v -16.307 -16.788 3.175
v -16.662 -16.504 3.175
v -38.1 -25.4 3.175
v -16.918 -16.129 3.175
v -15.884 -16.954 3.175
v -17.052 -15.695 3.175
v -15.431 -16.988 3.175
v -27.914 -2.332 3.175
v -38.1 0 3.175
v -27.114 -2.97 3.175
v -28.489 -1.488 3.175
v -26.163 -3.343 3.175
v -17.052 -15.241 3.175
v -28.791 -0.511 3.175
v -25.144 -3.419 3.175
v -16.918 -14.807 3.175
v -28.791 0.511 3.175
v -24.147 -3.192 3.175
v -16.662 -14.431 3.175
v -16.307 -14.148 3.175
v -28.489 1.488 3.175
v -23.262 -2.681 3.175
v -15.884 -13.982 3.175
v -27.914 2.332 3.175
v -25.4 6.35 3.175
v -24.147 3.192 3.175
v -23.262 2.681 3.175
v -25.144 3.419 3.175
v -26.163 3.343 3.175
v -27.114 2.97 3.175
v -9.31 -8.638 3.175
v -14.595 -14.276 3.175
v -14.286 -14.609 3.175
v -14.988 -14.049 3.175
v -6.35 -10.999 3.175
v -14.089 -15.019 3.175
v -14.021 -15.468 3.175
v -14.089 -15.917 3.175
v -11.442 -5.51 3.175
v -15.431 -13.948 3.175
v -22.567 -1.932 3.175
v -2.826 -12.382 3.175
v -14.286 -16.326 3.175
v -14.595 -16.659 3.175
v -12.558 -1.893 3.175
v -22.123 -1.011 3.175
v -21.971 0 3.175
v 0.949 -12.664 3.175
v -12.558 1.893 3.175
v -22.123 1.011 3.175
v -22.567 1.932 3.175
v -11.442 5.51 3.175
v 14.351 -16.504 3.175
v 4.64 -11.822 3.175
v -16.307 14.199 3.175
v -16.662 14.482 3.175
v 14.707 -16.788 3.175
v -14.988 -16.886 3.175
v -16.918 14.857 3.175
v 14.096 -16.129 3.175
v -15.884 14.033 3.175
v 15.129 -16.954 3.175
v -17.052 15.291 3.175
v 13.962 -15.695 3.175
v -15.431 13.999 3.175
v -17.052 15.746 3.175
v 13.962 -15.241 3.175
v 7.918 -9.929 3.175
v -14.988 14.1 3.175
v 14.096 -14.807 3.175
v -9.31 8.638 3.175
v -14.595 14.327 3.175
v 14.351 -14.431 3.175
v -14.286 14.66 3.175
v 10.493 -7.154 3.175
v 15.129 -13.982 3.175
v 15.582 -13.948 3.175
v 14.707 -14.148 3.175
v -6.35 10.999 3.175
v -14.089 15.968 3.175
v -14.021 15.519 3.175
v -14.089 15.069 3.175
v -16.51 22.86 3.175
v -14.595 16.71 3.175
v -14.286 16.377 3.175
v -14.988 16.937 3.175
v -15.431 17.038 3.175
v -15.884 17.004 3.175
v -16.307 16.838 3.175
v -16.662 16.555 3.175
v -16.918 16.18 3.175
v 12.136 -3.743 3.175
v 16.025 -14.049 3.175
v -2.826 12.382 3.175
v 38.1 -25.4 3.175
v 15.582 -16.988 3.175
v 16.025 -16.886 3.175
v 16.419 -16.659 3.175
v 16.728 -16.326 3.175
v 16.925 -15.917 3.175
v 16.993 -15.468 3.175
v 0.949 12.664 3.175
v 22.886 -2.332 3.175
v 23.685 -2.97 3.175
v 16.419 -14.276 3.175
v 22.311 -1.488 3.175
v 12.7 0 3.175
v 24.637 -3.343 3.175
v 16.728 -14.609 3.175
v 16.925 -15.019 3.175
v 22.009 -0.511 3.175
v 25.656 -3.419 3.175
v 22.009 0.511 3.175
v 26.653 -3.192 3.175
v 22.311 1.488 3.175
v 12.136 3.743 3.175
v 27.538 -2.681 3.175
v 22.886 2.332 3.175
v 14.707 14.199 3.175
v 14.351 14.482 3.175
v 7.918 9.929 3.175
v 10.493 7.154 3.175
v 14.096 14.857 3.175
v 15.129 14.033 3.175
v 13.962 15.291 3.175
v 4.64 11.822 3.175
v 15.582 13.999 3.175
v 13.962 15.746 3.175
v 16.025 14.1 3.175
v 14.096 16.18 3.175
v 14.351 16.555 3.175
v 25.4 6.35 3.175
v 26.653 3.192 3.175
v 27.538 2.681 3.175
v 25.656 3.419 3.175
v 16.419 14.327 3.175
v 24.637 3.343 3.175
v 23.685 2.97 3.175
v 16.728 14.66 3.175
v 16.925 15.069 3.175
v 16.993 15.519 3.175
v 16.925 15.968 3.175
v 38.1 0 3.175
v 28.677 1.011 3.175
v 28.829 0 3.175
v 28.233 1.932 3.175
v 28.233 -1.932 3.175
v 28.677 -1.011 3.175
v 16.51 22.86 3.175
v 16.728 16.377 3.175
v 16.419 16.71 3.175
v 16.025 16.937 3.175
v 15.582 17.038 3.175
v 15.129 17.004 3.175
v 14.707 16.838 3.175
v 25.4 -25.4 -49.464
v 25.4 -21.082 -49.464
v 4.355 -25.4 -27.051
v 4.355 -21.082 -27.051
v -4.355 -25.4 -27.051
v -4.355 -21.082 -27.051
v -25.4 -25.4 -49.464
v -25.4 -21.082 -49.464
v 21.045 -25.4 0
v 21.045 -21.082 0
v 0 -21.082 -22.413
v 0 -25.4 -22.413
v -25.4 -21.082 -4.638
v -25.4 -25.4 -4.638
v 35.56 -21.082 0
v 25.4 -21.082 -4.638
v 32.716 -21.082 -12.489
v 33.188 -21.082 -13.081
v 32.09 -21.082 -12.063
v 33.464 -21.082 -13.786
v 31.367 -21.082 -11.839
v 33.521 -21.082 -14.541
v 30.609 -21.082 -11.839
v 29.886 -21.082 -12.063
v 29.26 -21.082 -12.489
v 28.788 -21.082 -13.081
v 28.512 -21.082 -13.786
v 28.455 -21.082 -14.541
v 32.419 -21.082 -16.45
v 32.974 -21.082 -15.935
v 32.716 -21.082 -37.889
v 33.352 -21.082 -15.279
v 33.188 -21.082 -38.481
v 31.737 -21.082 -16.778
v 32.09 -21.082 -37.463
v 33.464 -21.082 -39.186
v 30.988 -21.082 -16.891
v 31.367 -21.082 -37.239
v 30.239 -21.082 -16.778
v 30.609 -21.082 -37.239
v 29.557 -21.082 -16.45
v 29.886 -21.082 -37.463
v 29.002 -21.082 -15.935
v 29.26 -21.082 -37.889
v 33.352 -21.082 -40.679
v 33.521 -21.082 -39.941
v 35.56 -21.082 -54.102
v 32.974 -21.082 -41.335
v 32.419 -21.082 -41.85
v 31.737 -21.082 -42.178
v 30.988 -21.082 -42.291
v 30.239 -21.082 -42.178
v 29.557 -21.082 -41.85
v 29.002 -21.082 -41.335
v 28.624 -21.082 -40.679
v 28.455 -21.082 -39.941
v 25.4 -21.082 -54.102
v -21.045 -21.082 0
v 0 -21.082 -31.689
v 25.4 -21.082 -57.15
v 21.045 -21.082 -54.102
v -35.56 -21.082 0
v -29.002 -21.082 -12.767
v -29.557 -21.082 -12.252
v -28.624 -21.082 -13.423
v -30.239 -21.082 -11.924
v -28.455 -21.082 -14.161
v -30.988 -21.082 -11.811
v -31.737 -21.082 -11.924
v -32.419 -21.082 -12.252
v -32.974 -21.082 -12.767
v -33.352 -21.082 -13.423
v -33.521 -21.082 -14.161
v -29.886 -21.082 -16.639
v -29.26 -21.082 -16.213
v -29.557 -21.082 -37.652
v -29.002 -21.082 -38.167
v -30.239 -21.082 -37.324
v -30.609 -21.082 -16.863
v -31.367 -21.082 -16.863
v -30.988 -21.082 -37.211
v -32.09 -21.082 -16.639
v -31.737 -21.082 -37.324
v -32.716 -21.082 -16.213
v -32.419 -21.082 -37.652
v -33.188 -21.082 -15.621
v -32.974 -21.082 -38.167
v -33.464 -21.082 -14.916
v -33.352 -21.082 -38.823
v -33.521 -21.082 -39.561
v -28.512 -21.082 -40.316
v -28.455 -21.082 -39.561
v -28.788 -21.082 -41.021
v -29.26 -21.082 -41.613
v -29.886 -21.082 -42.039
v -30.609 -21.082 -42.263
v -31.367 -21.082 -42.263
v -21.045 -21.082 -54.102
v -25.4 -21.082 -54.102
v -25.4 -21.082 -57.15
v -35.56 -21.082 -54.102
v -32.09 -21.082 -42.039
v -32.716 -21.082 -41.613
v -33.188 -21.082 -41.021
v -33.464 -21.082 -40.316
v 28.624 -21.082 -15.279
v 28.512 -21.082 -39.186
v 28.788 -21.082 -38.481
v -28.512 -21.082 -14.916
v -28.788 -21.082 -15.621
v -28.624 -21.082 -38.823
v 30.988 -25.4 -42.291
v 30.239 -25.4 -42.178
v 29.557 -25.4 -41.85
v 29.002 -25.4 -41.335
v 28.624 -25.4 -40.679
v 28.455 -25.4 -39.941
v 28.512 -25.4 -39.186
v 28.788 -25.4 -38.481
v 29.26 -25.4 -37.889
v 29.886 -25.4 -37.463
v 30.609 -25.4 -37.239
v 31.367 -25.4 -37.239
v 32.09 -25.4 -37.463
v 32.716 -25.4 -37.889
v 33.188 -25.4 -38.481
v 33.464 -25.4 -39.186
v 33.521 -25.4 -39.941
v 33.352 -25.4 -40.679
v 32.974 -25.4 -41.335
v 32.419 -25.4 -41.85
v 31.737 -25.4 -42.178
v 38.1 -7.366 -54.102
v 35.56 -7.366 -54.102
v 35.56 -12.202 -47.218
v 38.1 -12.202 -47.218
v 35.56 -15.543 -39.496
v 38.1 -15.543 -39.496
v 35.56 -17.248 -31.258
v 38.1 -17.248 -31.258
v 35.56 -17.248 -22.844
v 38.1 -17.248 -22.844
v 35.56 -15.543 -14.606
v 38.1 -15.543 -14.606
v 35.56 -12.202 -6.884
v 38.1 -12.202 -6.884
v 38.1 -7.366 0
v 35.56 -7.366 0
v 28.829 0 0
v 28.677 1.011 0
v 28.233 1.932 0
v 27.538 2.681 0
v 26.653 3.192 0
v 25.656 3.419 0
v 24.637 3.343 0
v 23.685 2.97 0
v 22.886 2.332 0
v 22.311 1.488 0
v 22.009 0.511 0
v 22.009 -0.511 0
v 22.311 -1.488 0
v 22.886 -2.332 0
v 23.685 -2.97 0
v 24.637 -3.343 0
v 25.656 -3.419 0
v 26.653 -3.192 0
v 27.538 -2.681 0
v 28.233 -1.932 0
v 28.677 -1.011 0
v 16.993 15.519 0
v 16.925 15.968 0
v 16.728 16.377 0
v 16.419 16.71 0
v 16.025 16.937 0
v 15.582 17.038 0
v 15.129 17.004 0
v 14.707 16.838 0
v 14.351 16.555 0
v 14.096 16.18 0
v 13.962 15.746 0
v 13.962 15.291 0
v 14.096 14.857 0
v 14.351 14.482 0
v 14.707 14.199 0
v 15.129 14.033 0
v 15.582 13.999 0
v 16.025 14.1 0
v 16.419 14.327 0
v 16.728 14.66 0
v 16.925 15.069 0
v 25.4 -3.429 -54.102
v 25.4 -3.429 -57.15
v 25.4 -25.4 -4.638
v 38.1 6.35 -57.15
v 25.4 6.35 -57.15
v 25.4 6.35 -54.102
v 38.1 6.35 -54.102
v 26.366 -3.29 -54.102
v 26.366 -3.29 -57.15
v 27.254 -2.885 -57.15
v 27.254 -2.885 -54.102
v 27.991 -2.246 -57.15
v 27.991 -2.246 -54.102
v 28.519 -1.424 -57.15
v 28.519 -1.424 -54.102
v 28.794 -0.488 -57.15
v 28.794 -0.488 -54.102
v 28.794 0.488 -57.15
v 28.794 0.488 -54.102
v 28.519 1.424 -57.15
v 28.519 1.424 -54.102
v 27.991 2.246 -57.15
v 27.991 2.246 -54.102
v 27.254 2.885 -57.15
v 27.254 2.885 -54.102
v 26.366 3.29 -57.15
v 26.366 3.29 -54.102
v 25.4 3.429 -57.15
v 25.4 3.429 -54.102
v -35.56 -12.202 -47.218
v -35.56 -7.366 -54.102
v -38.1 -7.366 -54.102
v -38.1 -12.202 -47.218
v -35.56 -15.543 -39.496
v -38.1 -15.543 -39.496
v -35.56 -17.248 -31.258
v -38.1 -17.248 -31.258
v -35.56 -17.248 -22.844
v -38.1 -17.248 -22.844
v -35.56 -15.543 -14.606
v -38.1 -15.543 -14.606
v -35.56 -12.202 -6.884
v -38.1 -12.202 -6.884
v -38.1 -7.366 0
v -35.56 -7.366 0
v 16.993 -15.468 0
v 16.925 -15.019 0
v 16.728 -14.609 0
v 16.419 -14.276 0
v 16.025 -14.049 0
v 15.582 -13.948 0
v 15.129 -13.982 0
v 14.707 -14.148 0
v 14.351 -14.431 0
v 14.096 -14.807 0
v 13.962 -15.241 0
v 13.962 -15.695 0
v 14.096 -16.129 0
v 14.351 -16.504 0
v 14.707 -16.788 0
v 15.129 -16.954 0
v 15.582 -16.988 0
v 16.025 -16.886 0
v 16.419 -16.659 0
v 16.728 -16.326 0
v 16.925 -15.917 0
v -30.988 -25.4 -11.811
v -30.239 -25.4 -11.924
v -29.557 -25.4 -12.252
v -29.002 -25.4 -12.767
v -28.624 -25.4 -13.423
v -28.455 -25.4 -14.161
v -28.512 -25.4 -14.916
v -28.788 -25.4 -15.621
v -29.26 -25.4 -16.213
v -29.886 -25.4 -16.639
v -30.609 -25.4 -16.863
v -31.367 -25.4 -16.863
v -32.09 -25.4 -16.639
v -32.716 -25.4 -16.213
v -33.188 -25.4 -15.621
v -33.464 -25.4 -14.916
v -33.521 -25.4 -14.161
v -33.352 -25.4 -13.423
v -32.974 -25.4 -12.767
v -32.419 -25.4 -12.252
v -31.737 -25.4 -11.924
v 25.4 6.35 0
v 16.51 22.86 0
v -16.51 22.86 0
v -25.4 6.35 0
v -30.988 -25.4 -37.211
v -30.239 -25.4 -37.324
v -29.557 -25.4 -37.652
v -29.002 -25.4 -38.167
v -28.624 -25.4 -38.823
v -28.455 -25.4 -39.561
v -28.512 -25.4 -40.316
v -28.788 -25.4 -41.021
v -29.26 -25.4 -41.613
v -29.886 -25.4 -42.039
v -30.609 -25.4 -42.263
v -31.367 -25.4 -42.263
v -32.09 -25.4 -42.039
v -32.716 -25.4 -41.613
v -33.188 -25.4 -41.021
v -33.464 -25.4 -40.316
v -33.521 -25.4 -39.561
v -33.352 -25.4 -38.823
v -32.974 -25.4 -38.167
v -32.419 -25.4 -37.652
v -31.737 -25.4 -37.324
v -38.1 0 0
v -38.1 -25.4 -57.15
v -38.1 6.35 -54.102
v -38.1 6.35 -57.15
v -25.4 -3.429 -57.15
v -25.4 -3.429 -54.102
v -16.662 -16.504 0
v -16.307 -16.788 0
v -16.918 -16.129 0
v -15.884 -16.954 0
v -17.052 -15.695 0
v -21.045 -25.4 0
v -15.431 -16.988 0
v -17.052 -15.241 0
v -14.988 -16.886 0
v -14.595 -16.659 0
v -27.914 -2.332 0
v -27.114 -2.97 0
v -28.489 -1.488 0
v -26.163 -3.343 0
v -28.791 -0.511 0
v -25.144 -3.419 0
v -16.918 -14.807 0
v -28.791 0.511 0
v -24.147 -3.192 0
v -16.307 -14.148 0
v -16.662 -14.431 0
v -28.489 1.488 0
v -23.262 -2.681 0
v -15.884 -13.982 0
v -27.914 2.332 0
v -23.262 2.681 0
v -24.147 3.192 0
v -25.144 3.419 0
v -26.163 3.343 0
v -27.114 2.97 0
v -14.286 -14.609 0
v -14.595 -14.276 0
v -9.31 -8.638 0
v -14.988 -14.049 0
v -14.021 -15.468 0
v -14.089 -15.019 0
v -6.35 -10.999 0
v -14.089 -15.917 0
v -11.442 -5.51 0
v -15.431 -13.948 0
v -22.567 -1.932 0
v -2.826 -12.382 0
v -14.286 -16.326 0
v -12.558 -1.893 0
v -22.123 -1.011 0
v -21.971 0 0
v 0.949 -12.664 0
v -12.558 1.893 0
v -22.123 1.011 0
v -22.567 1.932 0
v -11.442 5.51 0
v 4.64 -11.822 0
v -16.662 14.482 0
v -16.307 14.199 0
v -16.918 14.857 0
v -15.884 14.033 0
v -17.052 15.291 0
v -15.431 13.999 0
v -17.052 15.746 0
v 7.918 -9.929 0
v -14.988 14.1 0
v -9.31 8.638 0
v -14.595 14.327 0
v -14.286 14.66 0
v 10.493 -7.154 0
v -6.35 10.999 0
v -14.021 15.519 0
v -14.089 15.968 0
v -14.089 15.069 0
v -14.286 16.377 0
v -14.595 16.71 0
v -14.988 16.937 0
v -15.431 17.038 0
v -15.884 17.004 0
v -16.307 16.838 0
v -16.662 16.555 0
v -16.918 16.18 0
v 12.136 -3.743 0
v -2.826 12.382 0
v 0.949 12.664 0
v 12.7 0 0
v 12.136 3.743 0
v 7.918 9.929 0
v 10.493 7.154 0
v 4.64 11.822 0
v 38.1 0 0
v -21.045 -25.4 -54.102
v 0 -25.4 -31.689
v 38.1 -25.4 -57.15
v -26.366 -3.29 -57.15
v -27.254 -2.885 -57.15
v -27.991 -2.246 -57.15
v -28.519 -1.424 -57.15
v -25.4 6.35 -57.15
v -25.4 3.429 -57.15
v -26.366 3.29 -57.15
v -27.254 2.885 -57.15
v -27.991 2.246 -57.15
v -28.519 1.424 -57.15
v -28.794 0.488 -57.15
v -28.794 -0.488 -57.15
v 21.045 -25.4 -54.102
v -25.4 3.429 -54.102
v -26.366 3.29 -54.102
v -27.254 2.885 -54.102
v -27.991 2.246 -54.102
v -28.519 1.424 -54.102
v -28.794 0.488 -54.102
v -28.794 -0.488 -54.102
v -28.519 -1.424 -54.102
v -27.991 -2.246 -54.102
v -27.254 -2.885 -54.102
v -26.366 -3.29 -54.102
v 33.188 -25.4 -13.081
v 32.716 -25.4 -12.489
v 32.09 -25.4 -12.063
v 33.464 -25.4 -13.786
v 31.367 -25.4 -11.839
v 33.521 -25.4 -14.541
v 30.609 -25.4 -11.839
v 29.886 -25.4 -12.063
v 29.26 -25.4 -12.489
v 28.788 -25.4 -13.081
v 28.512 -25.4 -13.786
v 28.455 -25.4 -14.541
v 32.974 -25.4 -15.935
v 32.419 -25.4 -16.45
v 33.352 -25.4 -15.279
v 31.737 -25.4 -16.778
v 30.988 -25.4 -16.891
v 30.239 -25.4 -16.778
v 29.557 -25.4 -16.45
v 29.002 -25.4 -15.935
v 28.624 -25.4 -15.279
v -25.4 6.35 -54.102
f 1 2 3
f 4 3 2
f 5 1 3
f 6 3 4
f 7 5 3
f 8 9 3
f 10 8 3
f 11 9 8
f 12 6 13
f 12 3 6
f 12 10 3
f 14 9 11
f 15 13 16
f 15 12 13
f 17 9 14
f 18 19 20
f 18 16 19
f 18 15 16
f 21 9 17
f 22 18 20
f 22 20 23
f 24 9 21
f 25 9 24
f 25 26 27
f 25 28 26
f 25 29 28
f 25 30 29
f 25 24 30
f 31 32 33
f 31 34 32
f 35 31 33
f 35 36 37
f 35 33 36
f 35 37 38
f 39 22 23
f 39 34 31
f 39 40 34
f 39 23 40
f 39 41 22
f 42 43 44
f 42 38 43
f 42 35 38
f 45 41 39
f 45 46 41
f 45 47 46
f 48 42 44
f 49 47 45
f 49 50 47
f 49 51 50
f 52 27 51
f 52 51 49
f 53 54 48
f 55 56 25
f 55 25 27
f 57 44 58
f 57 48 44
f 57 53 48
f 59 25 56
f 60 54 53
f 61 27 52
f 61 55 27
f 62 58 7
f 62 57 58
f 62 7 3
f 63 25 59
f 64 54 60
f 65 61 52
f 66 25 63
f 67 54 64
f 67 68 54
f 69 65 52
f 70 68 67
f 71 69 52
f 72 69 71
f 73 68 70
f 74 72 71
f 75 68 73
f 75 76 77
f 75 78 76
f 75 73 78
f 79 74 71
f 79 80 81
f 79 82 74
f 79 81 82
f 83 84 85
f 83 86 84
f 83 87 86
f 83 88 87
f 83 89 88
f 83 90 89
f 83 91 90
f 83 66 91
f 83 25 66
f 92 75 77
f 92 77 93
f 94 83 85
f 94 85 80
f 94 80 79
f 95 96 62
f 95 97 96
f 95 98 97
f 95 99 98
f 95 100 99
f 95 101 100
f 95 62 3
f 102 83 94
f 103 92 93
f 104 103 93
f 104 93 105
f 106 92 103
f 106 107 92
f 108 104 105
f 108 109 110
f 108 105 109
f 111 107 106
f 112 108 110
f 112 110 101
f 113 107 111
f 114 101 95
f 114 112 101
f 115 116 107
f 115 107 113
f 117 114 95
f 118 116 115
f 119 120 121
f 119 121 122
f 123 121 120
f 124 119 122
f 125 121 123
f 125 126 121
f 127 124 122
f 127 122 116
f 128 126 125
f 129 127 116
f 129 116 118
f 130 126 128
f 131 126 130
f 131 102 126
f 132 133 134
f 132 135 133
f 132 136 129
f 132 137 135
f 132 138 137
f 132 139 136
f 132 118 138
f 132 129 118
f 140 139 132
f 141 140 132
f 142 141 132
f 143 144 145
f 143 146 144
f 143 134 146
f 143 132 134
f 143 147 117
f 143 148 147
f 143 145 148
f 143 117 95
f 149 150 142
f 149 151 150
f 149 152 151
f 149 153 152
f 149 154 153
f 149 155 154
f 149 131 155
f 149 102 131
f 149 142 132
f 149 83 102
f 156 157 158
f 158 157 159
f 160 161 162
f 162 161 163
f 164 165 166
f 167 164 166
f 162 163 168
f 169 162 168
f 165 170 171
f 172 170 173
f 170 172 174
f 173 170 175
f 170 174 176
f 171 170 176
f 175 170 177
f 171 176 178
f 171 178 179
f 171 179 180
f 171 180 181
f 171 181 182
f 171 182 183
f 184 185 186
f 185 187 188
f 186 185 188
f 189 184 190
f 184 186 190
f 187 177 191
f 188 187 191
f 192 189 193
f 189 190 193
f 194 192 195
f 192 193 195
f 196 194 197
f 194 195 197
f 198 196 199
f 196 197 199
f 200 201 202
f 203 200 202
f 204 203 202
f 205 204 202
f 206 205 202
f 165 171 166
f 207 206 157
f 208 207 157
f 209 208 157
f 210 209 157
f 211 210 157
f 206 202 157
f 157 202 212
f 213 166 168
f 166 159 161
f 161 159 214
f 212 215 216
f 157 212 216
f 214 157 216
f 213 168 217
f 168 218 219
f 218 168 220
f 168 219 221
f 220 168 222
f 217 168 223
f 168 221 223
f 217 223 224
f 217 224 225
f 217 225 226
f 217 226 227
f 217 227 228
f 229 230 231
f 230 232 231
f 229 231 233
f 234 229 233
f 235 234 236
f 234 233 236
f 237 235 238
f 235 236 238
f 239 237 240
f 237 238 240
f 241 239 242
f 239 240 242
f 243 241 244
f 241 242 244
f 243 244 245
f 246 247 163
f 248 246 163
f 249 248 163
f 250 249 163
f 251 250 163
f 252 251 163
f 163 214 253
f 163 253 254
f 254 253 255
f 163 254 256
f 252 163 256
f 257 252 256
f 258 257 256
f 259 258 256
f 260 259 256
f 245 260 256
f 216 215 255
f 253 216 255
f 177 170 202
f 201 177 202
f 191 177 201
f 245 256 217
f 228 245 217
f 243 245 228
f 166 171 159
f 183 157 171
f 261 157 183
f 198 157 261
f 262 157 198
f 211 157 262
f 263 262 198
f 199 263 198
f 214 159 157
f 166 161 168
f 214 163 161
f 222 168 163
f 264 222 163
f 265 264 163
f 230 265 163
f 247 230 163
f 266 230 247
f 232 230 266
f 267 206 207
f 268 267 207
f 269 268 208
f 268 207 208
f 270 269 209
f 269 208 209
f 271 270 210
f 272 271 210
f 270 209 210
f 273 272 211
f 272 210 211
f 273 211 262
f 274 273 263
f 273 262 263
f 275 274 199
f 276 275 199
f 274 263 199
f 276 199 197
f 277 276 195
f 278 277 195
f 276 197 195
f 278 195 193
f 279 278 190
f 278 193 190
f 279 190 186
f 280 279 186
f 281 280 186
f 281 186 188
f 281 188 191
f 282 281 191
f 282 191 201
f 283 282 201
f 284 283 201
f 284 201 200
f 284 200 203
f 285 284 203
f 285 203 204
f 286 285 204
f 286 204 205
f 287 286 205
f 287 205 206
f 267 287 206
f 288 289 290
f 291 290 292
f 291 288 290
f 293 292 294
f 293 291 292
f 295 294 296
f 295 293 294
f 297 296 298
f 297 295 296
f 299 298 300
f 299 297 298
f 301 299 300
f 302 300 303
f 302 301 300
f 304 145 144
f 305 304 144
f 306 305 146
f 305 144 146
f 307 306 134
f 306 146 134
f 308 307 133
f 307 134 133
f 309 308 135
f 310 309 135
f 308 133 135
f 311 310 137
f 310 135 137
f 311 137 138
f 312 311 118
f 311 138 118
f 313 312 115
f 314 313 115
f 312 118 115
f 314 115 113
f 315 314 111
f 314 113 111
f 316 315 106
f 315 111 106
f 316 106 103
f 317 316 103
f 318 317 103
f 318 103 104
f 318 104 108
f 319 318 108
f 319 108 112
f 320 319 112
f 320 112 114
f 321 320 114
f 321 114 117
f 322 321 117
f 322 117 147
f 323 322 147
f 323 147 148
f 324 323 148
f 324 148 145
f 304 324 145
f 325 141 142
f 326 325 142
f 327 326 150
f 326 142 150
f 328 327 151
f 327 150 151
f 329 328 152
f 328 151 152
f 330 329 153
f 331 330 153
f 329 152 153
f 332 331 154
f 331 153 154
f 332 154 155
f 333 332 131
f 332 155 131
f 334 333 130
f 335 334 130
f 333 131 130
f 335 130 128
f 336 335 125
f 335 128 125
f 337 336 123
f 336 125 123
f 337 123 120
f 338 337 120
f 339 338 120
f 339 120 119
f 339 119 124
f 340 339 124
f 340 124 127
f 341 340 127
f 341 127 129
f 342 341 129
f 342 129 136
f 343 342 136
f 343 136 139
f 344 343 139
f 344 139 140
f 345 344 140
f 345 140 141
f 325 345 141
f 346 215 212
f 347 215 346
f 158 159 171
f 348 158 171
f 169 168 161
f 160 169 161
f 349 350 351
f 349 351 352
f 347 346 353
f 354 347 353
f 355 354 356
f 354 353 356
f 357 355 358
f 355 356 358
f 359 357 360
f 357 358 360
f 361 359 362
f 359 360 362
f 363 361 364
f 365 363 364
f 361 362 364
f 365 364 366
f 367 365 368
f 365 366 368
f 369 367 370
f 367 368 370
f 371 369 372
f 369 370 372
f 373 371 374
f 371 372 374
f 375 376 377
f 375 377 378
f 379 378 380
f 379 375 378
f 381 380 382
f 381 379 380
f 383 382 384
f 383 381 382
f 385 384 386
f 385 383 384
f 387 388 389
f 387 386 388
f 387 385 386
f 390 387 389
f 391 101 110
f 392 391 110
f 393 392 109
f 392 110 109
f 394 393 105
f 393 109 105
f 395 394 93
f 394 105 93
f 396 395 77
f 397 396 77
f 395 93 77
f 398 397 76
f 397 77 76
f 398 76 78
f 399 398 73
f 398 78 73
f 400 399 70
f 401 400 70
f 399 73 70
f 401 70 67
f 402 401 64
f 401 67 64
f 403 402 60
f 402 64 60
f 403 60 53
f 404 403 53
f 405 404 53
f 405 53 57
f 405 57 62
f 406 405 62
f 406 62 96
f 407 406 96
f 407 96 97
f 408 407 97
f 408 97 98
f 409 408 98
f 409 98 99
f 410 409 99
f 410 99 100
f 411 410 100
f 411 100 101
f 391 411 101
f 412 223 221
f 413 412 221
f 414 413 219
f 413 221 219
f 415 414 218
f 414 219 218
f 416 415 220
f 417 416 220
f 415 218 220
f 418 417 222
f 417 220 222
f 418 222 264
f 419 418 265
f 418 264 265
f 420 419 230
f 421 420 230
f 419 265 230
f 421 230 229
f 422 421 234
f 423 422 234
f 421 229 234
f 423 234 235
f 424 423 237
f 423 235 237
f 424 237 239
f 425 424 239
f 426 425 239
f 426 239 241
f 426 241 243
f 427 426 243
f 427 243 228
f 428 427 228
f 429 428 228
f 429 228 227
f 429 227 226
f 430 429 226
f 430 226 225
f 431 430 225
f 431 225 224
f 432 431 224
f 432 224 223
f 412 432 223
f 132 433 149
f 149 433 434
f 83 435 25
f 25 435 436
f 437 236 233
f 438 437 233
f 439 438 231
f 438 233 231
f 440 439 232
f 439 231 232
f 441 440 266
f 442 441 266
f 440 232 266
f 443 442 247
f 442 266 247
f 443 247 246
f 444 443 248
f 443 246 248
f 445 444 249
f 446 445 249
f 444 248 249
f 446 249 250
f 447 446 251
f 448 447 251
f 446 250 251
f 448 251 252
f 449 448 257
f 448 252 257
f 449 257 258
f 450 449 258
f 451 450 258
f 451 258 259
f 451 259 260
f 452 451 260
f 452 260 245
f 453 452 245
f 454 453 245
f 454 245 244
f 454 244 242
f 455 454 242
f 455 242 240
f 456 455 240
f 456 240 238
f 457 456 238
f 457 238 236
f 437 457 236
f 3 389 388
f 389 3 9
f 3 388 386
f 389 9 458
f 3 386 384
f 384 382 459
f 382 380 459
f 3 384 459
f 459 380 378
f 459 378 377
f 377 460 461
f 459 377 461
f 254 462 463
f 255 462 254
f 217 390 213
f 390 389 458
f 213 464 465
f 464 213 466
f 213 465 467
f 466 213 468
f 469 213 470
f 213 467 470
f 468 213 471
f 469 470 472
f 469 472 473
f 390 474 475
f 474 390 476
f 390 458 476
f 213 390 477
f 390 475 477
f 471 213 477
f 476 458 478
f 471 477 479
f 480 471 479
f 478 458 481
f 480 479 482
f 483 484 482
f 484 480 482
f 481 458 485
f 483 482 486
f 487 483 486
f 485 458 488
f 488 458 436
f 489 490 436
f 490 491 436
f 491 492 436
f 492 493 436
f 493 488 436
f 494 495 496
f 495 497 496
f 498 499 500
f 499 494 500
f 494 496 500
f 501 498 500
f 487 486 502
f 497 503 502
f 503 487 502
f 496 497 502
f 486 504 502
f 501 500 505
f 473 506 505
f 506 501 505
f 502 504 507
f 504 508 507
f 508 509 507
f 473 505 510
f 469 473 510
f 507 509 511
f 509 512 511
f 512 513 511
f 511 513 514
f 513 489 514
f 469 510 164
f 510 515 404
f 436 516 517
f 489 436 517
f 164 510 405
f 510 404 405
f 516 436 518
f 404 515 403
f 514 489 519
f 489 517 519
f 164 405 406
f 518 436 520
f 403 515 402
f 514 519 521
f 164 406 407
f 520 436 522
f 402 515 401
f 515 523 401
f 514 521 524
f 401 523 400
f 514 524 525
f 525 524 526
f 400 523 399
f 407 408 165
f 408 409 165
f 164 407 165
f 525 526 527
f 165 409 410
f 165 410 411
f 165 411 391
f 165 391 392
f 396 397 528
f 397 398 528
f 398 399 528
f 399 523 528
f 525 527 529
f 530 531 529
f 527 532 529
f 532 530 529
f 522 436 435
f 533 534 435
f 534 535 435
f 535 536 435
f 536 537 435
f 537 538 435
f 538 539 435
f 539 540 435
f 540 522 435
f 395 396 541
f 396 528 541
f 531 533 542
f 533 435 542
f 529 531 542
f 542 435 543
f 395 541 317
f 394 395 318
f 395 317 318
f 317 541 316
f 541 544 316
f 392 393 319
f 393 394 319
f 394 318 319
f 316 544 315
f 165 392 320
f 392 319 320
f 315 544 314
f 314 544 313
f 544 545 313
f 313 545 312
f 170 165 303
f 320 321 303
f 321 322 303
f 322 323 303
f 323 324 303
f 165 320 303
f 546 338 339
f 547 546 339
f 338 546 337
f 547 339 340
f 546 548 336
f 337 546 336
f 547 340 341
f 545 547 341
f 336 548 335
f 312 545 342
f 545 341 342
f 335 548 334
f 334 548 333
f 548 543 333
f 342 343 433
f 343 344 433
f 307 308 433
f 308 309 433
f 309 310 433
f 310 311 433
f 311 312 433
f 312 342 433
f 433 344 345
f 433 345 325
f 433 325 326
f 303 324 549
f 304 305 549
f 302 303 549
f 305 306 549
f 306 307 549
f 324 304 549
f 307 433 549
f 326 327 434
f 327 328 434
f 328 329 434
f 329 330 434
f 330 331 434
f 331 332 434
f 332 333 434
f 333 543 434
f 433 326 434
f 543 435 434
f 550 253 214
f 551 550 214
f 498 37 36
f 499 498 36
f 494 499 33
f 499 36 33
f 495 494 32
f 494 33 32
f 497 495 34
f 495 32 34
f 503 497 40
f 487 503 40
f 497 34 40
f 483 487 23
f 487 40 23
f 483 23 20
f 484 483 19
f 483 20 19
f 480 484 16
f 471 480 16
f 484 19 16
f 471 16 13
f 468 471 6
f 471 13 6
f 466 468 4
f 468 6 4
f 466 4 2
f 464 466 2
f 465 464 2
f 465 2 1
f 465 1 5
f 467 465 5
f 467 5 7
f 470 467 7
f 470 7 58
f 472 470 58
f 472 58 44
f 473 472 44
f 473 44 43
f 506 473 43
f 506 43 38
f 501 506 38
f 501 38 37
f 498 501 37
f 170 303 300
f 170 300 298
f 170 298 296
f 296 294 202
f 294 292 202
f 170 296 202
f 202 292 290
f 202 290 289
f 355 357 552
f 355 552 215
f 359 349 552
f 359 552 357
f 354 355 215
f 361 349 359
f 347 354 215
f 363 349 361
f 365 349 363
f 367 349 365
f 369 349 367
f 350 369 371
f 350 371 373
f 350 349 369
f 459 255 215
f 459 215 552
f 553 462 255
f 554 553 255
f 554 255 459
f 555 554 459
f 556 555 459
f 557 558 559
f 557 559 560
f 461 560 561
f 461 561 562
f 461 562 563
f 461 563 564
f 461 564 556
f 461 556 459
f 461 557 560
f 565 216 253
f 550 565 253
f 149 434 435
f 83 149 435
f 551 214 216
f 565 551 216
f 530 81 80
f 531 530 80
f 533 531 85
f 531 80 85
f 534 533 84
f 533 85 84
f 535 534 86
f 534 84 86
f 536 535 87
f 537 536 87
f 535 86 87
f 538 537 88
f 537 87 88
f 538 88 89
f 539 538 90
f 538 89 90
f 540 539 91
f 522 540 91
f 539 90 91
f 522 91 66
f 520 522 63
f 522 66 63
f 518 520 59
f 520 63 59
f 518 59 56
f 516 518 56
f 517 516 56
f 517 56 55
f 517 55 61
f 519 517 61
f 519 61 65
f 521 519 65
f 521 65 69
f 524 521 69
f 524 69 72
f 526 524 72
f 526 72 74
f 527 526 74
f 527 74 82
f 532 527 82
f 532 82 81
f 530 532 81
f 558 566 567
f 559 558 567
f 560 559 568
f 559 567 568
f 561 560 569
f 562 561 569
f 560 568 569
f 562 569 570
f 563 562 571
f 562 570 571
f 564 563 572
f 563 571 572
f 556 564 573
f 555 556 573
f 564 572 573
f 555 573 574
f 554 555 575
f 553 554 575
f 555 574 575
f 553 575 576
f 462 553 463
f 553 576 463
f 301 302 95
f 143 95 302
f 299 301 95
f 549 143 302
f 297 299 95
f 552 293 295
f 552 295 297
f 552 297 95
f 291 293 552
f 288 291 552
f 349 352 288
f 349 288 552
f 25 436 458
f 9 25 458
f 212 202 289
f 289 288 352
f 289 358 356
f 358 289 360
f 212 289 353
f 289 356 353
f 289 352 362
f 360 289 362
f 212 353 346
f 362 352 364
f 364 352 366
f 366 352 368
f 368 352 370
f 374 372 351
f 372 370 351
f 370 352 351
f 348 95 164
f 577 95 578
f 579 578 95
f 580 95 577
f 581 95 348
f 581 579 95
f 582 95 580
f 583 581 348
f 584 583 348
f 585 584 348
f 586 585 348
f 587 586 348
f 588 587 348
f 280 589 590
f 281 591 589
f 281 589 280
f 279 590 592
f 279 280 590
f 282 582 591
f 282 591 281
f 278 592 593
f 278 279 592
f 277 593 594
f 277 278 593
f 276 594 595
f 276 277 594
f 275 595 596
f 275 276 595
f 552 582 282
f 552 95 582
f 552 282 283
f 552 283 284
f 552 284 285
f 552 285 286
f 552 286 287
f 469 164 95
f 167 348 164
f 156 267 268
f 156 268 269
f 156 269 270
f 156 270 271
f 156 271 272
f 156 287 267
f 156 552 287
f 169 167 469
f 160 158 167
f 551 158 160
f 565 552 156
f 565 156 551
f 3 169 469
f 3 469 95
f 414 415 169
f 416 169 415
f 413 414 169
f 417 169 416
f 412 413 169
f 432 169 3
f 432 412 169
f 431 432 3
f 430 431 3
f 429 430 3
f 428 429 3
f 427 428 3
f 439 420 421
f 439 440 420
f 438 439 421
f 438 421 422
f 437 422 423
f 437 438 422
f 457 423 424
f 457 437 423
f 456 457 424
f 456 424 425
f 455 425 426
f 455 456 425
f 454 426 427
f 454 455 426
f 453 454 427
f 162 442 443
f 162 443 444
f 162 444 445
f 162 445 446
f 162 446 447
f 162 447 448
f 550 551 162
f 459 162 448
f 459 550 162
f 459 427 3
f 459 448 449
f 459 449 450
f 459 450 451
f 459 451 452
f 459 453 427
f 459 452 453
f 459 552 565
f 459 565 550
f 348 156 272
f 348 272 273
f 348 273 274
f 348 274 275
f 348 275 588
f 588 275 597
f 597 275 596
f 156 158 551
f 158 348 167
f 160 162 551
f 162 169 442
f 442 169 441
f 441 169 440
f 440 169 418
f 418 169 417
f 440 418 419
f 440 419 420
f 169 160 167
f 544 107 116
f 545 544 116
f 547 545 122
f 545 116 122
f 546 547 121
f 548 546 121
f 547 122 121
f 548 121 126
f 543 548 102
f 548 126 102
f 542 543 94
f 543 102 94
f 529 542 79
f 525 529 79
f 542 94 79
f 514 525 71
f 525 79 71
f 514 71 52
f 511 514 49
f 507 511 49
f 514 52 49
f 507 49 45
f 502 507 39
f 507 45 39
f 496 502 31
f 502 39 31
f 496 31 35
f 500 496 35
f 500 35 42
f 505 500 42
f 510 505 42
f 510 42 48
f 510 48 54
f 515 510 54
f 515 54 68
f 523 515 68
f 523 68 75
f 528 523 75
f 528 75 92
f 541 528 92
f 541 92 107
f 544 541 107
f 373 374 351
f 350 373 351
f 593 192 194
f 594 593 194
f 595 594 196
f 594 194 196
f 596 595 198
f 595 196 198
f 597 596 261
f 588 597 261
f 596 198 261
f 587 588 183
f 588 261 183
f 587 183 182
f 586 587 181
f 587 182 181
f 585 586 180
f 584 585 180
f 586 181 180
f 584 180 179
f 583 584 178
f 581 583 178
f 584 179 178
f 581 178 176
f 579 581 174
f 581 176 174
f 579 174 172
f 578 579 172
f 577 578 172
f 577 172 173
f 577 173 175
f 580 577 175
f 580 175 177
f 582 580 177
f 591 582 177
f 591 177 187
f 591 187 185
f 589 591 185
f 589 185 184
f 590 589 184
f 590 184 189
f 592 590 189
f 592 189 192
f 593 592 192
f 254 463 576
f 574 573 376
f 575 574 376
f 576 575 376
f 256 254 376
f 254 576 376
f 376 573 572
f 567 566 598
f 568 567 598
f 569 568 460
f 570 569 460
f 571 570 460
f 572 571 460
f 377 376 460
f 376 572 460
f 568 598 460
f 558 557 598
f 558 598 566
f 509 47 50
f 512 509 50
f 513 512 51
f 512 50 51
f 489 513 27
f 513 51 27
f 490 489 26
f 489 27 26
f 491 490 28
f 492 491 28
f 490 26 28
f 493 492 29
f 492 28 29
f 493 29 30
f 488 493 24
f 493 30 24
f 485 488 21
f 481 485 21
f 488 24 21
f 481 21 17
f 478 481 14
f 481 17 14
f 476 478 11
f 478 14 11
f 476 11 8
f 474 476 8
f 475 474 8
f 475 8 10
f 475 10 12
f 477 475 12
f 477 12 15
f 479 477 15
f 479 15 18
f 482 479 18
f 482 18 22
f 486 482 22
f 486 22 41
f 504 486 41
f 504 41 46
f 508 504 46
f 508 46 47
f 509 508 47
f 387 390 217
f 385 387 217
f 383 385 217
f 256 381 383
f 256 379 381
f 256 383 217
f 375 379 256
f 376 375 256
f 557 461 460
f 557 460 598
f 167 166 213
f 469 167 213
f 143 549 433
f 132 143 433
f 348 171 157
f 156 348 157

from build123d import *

# Parameters (mm, degrees)
SKETCH1_R           = 1.27
SKETCH1_R_2         = 9.525
SKETCH1_R_3         = 3.175
BOSS_EXTRUDE1_DEPTH = 3.175
SKETCH2_W           = 76.2
SKETCH2_H           = 4.318
BOSS_EXTRUDE2_DEPTH = 54.102
BOSS_EXTRUDE3_START = 3.048
SKETCH3_W           = 76.2
SKETCH3_H           = 4.318
BOSS_EXTRUDE3_DEPTH = 3.048
SKETCH10_W          = 54.102
SKETCH10_H          = 13.716
BOSS_EXTRUDE7_DEPTH = 2.54
SKETCH5_R           = 3.429
SKETCH5_R_2         = 3.175
SKETCH5_R_3         = 1.524
SKETCH5_R_4         = 1.27
SKETCH5_R_5         = 9.779
SKETCH5_R_6         = 9.525
CUT_EXTRUDE2_DEPTH  = 76.735563806
CUT_EXTRUDE3_DEPTH  = 83.935570318
SKETCH7_R           = 12.7
CUT_EXTRUDE4_DEPTH  = 76.735563806
CUT_EXTRUDE5_DEPTH  = 99.578509321
CUT_EXTRUDE6_REACH  = 75.232
SKETCH15_R          = 2.54
CUT_EXTRUDE7_DEPTH  = 82.53914314


with BuildPart() as part:
    # Sketch1 → Boss-Extrude1 (new body)
    with BuildSketch(Plane.XY):
        Polygon((31.75, 25.4), (25.4, 25.4), (25.4, 22.86), (-25.4, 22.86), (-25.4, 25.4), (-31.75, 25.4), (-38.1, 0), (-38.1, -25.4), (38.1, -25.4), (38.1, 0), align=None)
        with Locations((-15.5448, 15.5186)):
            Circle(SKETCH1_R, mode=Mode.SUBTRACT)
        with Locations((15.4686, 15.5186)):
            Circle(SKETCH1_R, mode=Mode.SUBTRACT)
        with Locations((15.4686, -15.4678)):
            Circle(SKETCH1_R, mode=Mode.SUBTRACT)
        with Locations((-15.5448, -15.4678)):
            Circle(SKETCH1_R, mode=Mode.SUBTRACT)
        Circle(SKETCH1_R_2, mode=Mode.SUBTRACT)
        with Locations((-25.4, 0)):
            Circle(SKETCH1_R_3, mode=Mode.SUBTRACT)
        with Locations(Location((25.4, 0, 0), (0, 0, 180))):
            Circle(SKETCH1_R_3, mode=Mode.SUBTRACT)
    extrude(amount=BOSS_EXTRUDE1_DEPTH)

    # Sketch2 → Boss-Extrude2 (add)
    with BuildSketch(Plane(origin=(0, 0, 0), x_dir=(-1, 0, 0), z_dir=(0, 0, -1))):
        with Locations((0, -23.241)):
            Rectangle(SKETCH2_W, SKETCH2_H)
    extrude(amount=BOSS_EXTRUDE2_DEPTH)

    # Sketch3 → Boss-Extrude3 (add)
    with BuildSketch(Plane(origin=(0, 0, -54.102), x_dir=(-1, 0, 0), z_dir=(0, 0, -1)).offset(BOSS_EXTRUDE3_START)):
        with BuildLine():
            Line((-25.4, 6.35), (-38.1, 6.35))
            Line((-38.1, 6.35), (-38.1, -21.082))
            Line((-38.1, -21.082), (-25.4, -21.082))
            Line((-25.4, -21.082), (-25.4, -3.175))
            ThreePointArc((-25.4, -3.175), (-28.575, 0), (-25.4, 3.175))
            Line((-25.4, 3.175), (-25.4, 6.35))
        make_face()
        with BuildLine():
            Line((25.4, -3.175), (25.4, -21.082))
            Line((25.4, -21.082), (38.1, -21.082))
            Line((38.1, -21.082), (38.1, 6.35))
            Line((38.1, 6.35), (25.4, 6.35))
            Line((25.4, 6.35), (25.4, 3.175))
            ThreePointArc((25.4, 3.175), (27.64506403, 2.24506403), (28.575, 0))
            ThreePointArc((28.575, 0), (27.64506403, -2.24506403), (25.4, -3.175))
        make_face()
        with Locations((0, -23.241)):
            Rectangle(SKETCH3_W, SKETCH3_H)
    extrude(amount=-BOSS_EXTRUDE3_DEPTH)

    # Sketch10 → Boss-Extrude7 (add)
    with BuildSketch(Plane(origin=(38.1, 0, 0), x_dir=(0, 0, -1), z_dir=(1, 0, 0))):
        with Locations((27.051, -14.224)):
            Rectangle(SKETCH10_W, SKETCH10_H)
    boss_extrude7 = extrude(amount=-BOSS_EXTRUDE7_DEPTH)

    # Mirror4: Boss-Extrude7 across plane
    add(boss_extrude7.mirror(Plane(origin=(0, 0, 0), x_dir=(0, 0, 1), z_dir=(1, 0, 0))))

    # Sketch5 → Cut-Extrude2 (cut, through all)
    # profile 1 of 7: a face of its own
    with BuildSketch(Plane.XY.offset(3.175)):
        with Locations((-25.4, 0)):
            Circle(SKETCH5_R)
        with Locations((-25.4, 0)):
            Circle(SKETCH5_R_2, mode=Mode.SUBTRACT)
    # profile 2 of 7: a face of its own
    with BuildSketch(Plane.XY.offset(3.175)):
        with Locations((-15.5448, 15.5186)):
            Circle(SKETCH5_R_3)
        with Locations((-15.5448, 15.5186)):
            Circle(SKETCH5_R_4, mode=Mode.SUBTRACT)
    # profile 3 of 7: a face of its own
    with BuildSketch(Plane.XY.offset(3.175)):
        with Locations((15.4686, 15.5186)):
            Circle(SKETCH5_R_3)
        with Locations((15.4686, 15.5186)):
            Circle(SKETCH5_R_4, mode=Mode.SUBTRACT)
    # profile 4 of 7: a face of its own
    with BuildSketch(Plane.XY.offset(3.175)):
        Circle(SKETCH5_R_5)
        Circle(SKETCH5_R_6, mode=Mode.SUBTRACT)
    # profile 5 of 7: a face of its own
    with BuildSketch(Plane.XY.offset(3.175)):
        with Locations((25.4, 0)):
            Circle(SKETCH5_R)
        with Locations((25.4, 0)):
            Circle(SKETCH5_R_2, mode=Mode.SUBTRACT)
    # profile 6 of 7: a face of its own
    with BuildSketch(Plane.XY.offset(3.175)):
        with Locations((15.4686, -15.4678)):
            Circle(SKETCH5_R_3)
        with Locations((15.4686, -15.4678)):
            Circle(SKETCH5_R_4, mode=Mode.SUBTRACT)
    # profile 7 of 7: a face of its own
    with BuildSketch(Plane.XY.offset(3.175)):
        with Locations((-15.5448, -15.4678)):
            Circle(SKETCH5_R_3)
        with Locations((-15.5448, -15.4678)):
            Circle(SKETCH5_R_4, mode=Mode.SUBTRACT)
    extrude(amount=-CUT_EXTRUDE2_DEPTH, mode=Mode.SUBTRACT)

    # Sketch6 → Cut-Extrude3 (cut, through all)
    with BuildSketch(Plane(origin=(0, -21.082, 0), x_dir=(1, 0, 0), z_dir=(0, 1, 0))):
        Polygon((21.044738629, 54.102), (-21.044738629, 54.102), (0, 31.68935336), align=None)
        Polygon((-4.355261371, 27.051), (-25.4, 49.46364664), (-25.4, 4.63835336), align=None)
        Polygon((25.4, 4.63835336), (25.4, 49.46364664), (4.355261371, 27.051), align=None)
        Polygon((0, 22.41264664), (-21.044738629, 0), (21.044738629, 0), align=None)
    extrude(amount=-CUT_EXTRUDE3_DEPTH, mode=Mode.SUBTRACT)

    # Sketch7 → Cut-Extrude4 (cut, through all)
    with BuildSketch(Plane.XY.offset(3.175)):
        Circle(SKETCH7_R)
    extrude(amount=-CUT_EXTRUDE4_DEPTH, mode=Mode.SUBTRACT)

    # Sketch11 → Cut-Extrude5 (cut, through all)
    with BuildSketch(Plane(origin=(38.1, 0, 0), x_dir=(0, 0, -1), z_dir=(1, 0, 0))):
        with BuildLine():
            Line((0, -7.366), (54.102, -7.366))
            ThreePointArc((54.102, -7.366), (27.051, -17.462948896), (0, -7.366))
        make_face()
    extrude(amount=-CUT_EXTRUDE5_DEPTH, mode=Mode.SUBTRACT)

    # Sketch12 → Cut-Extrude6 (cut, up to next)
    with BuildSketch(Plane(origin=(0, 0, 0), x_dir=(-1, 0, 0), z_dir=(0, 0, -1)), mode=Mode.PRIVATE) as cut_extrude6_sk1:
        Polygon((25.4, 22.86), (16.51, 22.86), (25.4, 6.35), (38.1, 0), (31.75, 25.4), (25.4, 25.4), align=None)
    cut_extrude6_tool1 = extrude(cut_extrude6_sk1.sketch, amount=-CUT_EXTRUDE6_REACH, mode=Mode.PRIVATE) & part.part
    # Sketch12 → Cut-Extrude6 (cut, up to next)
    with BuildSketch(Plane(origin=(0, 0, 0), x_dir=(-1, 0, 0), z_dir=(0, 0, -1)), mode=Mode.PRIVATE) as cut_extrude6_sk2:
        Polygon((-25.4, 6.35), (-16.51, 22.86), (-25.4, 22.86), (-25.4, 25.4), (-31.75, 25.4), (-38.1, 0), align=None)
    cut_extrude6_tool2 = extrude(cut_extrude6_sk2.sketch, amount=-CUT_EXTRUDE6_REACH, mode=Mode.PRIVATE) & part.part
    add(cut_extrude6_tool1.solids().sort_by_distance((-28.333539, 14.25305, 0))[0], mode=Mode.SUBTRACT)
    add(cut_extrude6_tool2.solids().sort_by_distance((28.333539, 14.25305, 0))[0], mode=Mode.SUBTRACT)

    # Sketch15 → Cut-Extrude7 (cut, through all)
    with BuildSketch(Plane(origin=(0, -21.082, 0), x_dir=(1, 0, 0), z_dir=(0, 1, 0))):
        with Locations(Location((-30.988, 39.751, 0), (0, 0, 270))):
            Circle(SKETCH15_R)
        with Locations(Location((-30.988, 14.351, 0), (0, 0, 270))):
            Circle(SKETCH15_R)
        with Locations(Location((30.988, 14.351, 0), (0, 0, 90))):
            Circle(SKETCH15_R)
        with Locations(Location((30.988, 39.751, 0), (0, 0, 90))):
            Circle(SKETCH15_R)
    extrude(amount=-CUT_EXTRUDE7_DEPTH, mode=Mode.SUBTRACT)


solid = part.part
